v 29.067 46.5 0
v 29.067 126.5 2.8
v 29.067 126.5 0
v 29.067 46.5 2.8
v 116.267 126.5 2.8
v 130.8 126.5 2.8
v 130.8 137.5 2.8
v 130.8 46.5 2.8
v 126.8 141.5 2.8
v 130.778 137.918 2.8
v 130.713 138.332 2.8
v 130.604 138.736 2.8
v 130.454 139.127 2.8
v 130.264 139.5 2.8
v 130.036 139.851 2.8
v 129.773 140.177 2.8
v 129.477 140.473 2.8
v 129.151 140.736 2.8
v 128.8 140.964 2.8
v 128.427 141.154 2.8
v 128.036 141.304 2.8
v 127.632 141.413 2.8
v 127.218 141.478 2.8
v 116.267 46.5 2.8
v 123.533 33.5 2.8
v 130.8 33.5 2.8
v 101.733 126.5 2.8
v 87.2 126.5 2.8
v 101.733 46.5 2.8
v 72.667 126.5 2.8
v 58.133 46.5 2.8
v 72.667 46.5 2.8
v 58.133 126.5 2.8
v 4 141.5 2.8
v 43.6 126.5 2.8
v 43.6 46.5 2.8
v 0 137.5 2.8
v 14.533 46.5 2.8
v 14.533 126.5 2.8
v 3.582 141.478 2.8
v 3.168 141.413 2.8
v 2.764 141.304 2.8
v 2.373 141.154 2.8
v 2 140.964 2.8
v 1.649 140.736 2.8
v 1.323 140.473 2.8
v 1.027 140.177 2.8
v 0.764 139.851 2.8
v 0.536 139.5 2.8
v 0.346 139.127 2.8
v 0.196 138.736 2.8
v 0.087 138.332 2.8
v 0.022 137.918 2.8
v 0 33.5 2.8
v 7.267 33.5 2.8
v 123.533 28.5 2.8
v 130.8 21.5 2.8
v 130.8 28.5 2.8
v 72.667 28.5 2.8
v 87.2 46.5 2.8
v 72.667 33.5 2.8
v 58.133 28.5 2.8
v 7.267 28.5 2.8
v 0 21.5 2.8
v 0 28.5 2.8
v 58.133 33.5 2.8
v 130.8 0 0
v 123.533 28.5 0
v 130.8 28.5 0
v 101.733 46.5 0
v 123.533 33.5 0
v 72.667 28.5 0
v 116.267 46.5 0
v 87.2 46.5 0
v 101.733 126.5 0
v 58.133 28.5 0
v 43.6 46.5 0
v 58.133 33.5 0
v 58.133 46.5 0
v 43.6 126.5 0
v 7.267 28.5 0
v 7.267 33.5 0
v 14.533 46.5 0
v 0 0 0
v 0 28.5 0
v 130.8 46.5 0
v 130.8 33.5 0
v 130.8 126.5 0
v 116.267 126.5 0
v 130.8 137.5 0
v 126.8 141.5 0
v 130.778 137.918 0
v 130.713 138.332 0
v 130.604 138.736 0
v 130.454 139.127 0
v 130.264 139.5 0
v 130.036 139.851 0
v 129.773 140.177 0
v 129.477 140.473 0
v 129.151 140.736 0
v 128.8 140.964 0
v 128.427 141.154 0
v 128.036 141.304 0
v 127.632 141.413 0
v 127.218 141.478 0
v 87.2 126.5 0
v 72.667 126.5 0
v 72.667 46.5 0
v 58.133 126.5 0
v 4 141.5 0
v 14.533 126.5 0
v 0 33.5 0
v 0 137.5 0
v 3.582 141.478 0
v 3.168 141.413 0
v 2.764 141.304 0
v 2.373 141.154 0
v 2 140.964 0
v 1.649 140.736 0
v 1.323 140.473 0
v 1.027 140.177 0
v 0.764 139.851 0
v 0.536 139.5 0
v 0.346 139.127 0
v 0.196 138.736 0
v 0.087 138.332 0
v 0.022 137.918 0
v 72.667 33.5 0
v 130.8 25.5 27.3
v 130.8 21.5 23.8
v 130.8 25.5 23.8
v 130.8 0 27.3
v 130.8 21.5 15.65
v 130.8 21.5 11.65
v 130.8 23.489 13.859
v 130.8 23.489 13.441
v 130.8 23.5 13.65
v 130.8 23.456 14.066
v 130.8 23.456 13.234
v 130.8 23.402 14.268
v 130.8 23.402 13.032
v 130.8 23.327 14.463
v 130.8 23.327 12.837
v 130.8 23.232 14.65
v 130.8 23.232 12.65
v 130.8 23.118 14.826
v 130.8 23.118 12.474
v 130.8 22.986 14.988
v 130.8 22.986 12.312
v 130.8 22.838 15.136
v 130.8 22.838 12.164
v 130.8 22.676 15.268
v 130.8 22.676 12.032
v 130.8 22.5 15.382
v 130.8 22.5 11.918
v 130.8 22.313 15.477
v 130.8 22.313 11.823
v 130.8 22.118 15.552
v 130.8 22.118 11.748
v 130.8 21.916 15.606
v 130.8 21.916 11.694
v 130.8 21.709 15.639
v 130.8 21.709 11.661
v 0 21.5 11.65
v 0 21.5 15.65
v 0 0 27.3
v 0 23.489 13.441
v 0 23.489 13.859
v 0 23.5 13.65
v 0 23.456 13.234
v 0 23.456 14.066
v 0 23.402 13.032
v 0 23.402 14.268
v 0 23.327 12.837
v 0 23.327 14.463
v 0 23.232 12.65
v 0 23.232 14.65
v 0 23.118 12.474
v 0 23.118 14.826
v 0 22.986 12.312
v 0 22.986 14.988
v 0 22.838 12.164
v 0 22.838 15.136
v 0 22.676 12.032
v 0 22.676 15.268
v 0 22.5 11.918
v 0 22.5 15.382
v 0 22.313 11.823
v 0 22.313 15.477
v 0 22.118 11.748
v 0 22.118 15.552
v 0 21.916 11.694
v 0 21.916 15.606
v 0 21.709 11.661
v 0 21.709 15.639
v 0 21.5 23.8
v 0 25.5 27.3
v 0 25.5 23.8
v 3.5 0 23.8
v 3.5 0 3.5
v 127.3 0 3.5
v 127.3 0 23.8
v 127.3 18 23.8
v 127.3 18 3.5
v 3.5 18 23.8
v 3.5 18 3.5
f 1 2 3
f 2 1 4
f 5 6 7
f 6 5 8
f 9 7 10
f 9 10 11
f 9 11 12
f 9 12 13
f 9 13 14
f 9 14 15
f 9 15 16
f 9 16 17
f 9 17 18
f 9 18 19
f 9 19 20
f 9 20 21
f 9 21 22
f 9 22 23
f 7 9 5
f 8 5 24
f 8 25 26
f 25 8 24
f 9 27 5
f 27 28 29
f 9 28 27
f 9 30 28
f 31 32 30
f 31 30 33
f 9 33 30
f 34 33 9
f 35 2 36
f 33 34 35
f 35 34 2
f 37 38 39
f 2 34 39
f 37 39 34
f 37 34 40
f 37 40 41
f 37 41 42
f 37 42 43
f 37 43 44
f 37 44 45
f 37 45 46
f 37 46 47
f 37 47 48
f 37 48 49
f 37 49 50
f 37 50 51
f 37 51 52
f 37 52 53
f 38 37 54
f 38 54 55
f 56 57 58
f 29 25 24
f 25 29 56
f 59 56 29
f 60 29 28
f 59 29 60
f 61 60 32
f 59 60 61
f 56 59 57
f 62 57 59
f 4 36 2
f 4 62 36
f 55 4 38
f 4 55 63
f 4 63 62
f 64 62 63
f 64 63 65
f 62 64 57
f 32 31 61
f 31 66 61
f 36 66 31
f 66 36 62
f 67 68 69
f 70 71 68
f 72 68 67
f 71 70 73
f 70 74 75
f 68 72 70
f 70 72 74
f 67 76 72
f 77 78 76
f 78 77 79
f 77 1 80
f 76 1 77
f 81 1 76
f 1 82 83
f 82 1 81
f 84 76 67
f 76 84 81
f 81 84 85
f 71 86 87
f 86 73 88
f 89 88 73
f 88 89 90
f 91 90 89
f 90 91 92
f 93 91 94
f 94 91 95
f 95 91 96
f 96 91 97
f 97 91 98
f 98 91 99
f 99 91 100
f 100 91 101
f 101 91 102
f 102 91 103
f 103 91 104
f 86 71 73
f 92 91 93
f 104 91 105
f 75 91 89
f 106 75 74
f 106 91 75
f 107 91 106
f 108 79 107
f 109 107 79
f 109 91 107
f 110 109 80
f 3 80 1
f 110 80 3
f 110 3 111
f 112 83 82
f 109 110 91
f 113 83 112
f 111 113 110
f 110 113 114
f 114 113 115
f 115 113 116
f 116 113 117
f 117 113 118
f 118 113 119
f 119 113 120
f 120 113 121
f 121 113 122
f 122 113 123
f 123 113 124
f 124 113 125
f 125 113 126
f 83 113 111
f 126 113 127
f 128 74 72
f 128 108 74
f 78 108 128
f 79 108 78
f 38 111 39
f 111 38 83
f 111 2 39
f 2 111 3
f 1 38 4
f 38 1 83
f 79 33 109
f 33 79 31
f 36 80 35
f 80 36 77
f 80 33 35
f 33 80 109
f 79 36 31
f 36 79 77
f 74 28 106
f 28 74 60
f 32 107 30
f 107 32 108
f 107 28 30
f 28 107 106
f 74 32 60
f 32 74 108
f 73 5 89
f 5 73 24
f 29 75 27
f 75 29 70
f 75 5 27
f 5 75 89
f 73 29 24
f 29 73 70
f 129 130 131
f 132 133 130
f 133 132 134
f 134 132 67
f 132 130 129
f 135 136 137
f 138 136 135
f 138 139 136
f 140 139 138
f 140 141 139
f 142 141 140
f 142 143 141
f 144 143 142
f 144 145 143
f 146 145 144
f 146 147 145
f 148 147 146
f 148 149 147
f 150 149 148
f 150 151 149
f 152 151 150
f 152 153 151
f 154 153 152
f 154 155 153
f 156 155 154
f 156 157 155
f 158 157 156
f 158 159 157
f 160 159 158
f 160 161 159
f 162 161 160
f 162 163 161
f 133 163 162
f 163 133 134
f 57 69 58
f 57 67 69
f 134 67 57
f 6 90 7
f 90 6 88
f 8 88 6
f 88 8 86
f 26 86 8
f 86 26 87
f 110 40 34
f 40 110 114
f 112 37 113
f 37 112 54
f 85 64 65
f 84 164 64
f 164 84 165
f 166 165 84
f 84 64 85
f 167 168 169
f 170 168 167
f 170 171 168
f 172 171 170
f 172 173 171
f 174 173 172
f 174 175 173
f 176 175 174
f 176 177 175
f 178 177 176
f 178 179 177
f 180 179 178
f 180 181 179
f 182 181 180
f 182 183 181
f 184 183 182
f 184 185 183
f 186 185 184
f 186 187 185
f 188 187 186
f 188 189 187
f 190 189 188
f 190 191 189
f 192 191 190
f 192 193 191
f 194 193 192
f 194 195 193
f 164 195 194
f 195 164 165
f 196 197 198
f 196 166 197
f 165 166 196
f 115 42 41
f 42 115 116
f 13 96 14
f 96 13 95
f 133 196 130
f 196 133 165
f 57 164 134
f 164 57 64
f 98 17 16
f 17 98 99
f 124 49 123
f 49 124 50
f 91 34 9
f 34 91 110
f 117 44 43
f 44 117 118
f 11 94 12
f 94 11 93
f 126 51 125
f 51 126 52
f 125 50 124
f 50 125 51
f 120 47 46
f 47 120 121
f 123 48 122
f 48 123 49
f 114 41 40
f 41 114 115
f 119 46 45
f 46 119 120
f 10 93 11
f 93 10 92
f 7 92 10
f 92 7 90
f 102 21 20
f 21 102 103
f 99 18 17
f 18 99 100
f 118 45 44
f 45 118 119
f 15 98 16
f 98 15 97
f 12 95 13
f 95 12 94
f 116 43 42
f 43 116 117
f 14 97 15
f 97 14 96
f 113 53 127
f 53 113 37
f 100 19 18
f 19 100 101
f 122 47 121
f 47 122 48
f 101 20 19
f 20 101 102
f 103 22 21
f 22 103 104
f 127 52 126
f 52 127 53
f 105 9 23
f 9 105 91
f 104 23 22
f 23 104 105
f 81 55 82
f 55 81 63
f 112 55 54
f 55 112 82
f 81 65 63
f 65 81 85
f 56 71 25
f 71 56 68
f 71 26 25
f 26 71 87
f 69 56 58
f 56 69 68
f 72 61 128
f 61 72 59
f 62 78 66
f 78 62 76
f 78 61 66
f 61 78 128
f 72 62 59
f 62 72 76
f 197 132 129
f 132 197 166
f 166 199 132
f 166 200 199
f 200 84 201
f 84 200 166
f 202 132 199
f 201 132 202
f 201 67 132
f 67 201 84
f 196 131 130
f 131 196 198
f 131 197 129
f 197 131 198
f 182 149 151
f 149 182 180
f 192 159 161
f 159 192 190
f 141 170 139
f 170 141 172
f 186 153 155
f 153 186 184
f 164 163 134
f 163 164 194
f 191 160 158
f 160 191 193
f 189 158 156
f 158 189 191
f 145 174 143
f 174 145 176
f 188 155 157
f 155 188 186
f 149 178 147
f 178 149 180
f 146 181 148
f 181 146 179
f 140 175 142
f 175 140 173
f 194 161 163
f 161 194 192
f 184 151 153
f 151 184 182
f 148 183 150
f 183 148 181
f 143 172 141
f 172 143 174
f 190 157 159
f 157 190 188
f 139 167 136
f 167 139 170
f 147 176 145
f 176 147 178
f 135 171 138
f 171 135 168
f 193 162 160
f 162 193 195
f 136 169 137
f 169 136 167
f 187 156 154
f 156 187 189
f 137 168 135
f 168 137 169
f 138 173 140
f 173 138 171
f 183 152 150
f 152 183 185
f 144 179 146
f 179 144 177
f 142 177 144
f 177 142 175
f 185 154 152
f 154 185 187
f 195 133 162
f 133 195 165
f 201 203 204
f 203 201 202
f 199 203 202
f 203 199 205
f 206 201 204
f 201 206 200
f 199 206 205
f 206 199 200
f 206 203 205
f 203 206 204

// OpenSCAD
socket_width = 122.8 + 1;   // add 1mm 
socket_depth = 19.8 + 0.5;  // add 0.5mm
socket_height = 18;
socket_gauge = 3.5;

plate_gauge = 2.8;
plate_height = 120;
plate_width = socket_width+2*socket_gauge;


$fn=60;

// ===================================================


module panel()
{
    corner_r = 4;

    translate([0,+socket_height+socket_gauge,0])
    
    difference()
    {
        // plate with round corners
        hull()
        {
                cube([
                    plate_width,
                    plate_height-corner_r,
                    plate_gauge
                ]);
                
                // round corners
                translate([corner_r,plate_height-corner_r,0])
                    cylinder(r=corner_r, h=plate_gauge, center=false);
            
                translate([
                    socket_width+2*socket_gauge-corner_r,
                    plate_height-corner_r,
                    0])
                    cylinder(r=corner_r, h=plate_gauge, center=false);        
        } 
        
        // 4 vertical cut outs       
        hole_width = plate_width/9;
        for (i=[0:4])
            translate([i*2*hole_width+hole_width,25,0])
                cube([hole_width,plate_height-40,plate_gauge]);

        // break outline for reduced warping
        translate([0,7,0])
            cube([hole_width/2,5,plate_gauge]);

        translate([plate_width-hole_width/2,7,0])
            cube([hole_width/2,5,plate_gauge]);   
   
        translate([4*hole_width,7,0])
           cube([hole_width,5,plate_gauge]);      
        
    } 

    

}

module socket()
{
    difference()
    {
        union()
        {
        
            // base cube
            cube([
                socket_width+2*socket_gauge,
                socket_height+socket_gauge,
                socket_depth+2*socket_gauge
            ]);

            // nose, front restraint for iPad
            translate([
                0,
                socket_height+socket_gauge,
                socket_depth+socket_gauge
            ])
                cube([
                    socket_width+2*socket_gauge,
                    4,
                    socket_gauge
                ]);
            
            // midlle restraint, half cylinder
            translate([
                0,
                socket_height+socket_gauge,
                socket_depth/2+socket_gauge
            ])
                rotate([0,90,0])
                    cylinder(
                        r=2, 
                        h=socket_width+2*socket_gauge, 
                        center=false
                    );
        
        }
        
        // subtract the Concept-2 Display encasing from base cube
        translate([socket_gauge, 0, socket_gauge])
        cube([
            socket_width,
            socket_height,
            socket_depth
        ]);
        
        
    }
}

panel();
socket();
